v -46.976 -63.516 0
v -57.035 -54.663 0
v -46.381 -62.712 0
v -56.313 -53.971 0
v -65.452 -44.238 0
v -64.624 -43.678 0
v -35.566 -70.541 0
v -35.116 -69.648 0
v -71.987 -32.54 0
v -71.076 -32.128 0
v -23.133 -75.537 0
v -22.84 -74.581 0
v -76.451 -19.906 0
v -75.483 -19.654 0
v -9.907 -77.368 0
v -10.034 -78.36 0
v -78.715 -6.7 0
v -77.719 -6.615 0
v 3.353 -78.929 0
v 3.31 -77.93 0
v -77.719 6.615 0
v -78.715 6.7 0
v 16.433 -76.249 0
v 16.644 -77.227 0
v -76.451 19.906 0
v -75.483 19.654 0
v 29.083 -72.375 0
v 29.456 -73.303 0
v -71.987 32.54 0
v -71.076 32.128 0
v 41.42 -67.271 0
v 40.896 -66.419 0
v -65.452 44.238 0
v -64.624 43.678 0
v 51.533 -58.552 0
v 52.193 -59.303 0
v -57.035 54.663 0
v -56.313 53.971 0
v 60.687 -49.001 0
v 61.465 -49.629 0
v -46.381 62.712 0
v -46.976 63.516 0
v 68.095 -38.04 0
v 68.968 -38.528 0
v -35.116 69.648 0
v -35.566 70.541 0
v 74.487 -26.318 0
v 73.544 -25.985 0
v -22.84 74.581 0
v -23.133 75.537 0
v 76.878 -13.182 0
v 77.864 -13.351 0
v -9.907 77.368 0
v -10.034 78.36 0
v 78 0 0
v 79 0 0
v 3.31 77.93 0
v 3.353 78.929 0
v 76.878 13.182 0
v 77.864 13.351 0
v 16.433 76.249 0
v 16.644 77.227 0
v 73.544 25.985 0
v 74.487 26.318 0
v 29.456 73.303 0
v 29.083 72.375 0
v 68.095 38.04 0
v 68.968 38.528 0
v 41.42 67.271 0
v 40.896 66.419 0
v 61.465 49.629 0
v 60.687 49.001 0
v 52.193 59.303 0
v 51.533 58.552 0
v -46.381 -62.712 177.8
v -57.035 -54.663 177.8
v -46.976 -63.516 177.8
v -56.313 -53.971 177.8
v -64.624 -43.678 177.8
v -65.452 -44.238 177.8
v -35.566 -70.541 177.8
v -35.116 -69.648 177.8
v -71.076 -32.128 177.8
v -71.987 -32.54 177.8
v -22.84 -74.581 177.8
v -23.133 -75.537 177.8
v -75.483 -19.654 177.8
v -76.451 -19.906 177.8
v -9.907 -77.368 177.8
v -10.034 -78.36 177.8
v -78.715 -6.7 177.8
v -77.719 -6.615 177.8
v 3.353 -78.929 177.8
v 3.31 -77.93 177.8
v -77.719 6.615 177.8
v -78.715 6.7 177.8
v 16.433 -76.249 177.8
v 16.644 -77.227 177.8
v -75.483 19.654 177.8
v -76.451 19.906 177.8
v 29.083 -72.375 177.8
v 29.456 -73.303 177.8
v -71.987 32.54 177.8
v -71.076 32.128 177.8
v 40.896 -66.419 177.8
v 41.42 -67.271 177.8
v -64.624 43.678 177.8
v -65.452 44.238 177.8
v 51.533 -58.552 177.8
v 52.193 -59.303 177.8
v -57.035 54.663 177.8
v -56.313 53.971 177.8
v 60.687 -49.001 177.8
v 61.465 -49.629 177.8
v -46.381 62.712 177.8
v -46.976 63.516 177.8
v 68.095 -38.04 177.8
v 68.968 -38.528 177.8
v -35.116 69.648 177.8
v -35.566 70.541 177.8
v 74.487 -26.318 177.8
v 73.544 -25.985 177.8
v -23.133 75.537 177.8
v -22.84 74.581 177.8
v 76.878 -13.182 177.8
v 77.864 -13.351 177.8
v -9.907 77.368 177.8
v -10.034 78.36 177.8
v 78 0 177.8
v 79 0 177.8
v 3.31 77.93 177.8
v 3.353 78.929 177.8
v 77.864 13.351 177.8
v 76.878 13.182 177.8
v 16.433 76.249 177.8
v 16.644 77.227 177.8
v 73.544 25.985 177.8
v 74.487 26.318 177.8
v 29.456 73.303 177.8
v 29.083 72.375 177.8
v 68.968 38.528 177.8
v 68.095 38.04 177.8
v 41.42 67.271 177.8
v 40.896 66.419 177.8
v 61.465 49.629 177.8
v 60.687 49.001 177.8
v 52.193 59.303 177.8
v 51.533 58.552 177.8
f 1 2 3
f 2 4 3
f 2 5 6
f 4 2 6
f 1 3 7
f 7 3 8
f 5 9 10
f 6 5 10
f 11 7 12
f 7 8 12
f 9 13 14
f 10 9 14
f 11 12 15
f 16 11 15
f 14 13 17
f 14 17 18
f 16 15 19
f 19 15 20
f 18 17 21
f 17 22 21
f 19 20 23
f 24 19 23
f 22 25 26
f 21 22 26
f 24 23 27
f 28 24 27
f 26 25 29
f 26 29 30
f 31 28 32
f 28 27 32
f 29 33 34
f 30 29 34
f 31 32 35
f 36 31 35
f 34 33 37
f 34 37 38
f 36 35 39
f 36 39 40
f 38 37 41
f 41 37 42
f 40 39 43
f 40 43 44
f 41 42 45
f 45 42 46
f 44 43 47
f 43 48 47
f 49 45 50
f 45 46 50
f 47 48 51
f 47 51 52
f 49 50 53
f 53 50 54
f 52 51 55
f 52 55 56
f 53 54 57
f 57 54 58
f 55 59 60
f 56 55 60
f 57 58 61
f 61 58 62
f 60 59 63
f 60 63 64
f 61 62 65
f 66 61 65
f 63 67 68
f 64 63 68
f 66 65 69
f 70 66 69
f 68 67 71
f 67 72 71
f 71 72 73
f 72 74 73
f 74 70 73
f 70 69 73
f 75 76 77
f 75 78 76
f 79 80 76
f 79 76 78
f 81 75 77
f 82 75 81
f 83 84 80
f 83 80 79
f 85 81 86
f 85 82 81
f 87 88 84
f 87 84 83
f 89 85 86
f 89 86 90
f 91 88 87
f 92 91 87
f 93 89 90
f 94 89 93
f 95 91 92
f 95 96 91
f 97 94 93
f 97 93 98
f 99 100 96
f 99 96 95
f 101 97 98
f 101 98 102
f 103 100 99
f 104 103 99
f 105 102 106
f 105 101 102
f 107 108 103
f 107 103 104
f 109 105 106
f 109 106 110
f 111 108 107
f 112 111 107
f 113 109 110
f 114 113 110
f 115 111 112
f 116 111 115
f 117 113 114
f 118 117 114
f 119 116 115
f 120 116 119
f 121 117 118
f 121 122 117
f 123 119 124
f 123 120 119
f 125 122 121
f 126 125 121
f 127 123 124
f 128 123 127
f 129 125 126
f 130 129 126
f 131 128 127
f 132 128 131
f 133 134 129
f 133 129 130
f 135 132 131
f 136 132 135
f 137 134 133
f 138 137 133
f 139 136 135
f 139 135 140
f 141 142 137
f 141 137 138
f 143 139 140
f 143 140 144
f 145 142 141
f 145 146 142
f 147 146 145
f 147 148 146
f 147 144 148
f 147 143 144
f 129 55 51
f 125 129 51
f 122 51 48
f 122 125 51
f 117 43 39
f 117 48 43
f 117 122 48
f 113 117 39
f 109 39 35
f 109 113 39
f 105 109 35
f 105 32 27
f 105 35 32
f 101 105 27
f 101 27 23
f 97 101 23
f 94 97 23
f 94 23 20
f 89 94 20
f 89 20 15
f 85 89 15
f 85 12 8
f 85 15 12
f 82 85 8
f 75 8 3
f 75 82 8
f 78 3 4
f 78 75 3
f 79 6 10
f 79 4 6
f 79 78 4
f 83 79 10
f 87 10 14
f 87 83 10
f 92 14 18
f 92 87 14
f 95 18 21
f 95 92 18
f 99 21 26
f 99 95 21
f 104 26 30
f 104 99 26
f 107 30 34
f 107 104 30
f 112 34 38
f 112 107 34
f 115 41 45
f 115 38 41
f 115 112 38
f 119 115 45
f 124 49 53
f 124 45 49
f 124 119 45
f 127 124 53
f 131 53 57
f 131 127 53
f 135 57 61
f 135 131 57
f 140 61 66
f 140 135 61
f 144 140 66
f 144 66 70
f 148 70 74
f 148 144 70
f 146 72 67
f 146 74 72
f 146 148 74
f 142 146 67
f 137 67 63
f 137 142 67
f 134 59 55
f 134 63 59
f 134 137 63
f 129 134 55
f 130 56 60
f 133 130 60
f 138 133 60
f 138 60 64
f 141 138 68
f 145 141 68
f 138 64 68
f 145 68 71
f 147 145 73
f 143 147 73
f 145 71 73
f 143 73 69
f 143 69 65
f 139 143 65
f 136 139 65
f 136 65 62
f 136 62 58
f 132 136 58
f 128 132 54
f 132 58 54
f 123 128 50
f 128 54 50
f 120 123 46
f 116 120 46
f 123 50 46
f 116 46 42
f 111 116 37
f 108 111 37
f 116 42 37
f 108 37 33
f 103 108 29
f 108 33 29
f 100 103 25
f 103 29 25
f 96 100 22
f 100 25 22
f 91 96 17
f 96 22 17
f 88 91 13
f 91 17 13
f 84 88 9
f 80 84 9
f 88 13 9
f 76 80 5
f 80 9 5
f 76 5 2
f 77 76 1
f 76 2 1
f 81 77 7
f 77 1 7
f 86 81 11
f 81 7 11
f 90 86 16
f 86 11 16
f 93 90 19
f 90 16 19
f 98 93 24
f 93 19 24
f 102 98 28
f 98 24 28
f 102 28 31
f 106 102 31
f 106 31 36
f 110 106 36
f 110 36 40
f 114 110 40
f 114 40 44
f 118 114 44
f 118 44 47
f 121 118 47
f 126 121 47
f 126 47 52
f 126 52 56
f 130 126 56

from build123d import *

# Parameters (mm, degrees)
F0_R     = 79
F1_DEPTH = 177.8
F2_T     = -1
F3_DEPTH = 1.001
F4_R     = 2
F5_DEPTH = 110


with BuildPart() as f1:
    # F0 (on Top) → F1 (new body)
    with BuildSketch(Plane.XY):
        Circle(F0_R)
    extrude(amount=F1_DEPTH)

    # F2
    f2_openings = [f1.faces().sort_by_distance(p)[0] for p in [
        (0, 0, 177.8),
    ]]
    offset(amount=F2_T, openings=f2_openings)

    # F3 (cut, through all): a face of the model
    f3_faces = [f1.faces().sort_by_distance(p)[0] for p in [
        (0, 0, 1),
    ]]
    extrude(f3_faces, amount=-F3_DEPTH, mode=Mode.SUBTRACT)


with BuildPart() as f5:
    # F4 (on Top) → F5 (new body)
    with BuildSketch(Plane.XY):
        with Locations((-59.2270195484, 59.6657395363)):
            Circle(F4_R)
    extrude(amount=F5_DEPTH)


solid = f1.part
